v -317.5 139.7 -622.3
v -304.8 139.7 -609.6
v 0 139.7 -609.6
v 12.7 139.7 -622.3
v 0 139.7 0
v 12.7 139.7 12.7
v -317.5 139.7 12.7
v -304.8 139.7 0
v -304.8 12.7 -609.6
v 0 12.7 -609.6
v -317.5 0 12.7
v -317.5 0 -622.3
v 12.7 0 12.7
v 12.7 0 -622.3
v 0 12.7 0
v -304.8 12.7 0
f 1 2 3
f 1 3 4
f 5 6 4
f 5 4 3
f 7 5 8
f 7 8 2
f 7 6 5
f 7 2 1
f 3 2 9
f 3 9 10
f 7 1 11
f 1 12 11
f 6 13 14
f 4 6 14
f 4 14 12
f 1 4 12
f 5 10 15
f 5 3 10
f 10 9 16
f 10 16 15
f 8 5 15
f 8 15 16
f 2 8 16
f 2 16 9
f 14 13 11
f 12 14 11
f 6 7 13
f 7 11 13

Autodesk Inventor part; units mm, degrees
ref_plane "YZ Plane" through (0, 0, 0) normal (1, 0, 0) x (0, 1, 0)
ref_plane "XZ Plane" through (0, 0, 0) normal (0, 1, 0) x (-1, 0, 0)
ref_plane "XY Plane" through (0, 0, 0) normal (0, 0, 1) x (1, 0, 0)
sketch "Sketch1" plane through (0, 0, 0) normal (0, 1, 0) x (-1, 0, 0)
  line L0 (0, 0) -> (304.8, 0)
  line L1 (304.8, 0) -> (304.8, -609.6)
  line L2 (304.8, -609.6) -> (0, -609.6)
  line L3 (0, -609.6) -> (0, 0)
  line L4 (317.5, 12.7) -> (-12.7, 12.7)
  line L5 (-12.7, 12.7) -> (-12.7, -622.3)
  line L6 (-12.7, -622.3) -> (317.5, -622.3)
  line L7 (317.5, -622.3) -> (317.5, 12.7)
  dimension "d0" = 304.8
  dimension "d1" = 609.6
  dimension "d2" = 12.7
extrude "Extrusion1" add sketch "Sketch1" along normal blind 139.7 contours L0 L1 L2 L3 | L7 L6 L5 L4
sketch "Sketch2" plane through (0, 139.7, 0) normal (0, 1, 0) x (1, 0, 0)
  line L0 (0, 0) -> (-304.8, 0)
  line L1 (-304.8, 0) -> (-304.8, 609.6)
  line L2 (-304.8, 609.6) -> (0, 609.6)
  line L3 (0, 609.6) -> (0, 0)
  dimension "d5" = 304.8
  dimension "d6" = 609.6
extrude "Extrusion2" cut sketch "Sketch2" against normal blind 127
properties part number "PlantBox"
